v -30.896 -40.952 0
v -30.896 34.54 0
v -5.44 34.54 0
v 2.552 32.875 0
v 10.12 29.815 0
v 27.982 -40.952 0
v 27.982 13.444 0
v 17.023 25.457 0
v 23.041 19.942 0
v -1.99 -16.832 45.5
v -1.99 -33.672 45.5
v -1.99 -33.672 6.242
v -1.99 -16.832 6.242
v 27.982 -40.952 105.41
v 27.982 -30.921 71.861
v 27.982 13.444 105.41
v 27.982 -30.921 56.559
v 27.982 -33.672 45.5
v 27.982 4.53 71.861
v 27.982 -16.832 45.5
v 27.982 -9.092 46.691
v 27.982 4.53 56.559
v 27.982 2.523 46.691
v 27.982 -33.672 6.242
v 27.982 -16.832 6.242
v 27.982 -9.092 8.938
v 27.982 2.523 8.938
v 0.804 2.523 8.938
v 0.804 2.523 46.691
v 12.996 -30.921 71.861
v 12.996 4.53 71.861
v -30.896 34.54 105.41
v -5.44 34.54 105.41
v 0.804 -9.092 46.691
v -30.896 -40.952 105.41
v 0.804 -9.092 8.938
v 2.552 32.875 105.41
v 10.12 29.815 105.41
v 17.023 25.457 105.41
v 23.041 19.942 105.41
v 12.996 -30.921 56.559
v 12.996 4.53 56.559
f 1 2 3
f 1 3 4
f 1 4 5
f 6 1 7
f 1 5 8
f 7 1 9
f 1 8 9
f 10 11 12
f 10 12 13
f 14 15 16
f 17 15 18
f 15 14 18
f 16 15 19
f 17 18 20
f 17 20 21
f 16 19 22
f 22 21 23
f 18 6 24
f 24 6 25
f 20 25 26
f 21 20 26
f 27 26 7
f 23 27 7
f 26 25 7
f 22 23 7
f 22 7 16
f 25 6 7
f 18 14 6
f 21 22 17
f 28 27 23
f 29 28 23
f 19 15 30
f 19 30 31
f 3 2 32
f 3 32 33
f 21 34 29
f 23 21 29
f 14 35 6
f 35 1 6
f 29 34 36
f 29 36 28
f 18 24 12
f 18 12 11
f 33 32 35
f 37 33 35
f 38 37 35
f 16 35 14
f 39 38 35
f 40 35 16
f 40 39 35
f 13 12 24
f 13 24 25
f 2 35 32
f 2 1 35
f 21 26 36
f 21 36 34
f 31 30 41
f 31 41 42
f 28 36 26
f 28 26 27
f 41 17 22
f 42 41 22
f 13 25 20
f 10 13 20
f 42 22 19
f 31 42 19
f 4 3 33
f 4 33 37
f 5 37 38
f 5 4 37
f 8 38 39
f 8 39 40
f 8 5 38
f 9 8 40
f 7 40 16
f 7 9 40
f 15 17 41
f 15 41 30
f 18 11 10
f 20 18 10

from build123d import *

# Parameters (mm, degrees)
F0_W      = 58.878030628
F0_H      = 75.4921324551
F1_DEPTH  = 25.4
F3_DEPTH  = 25.4
F4_DEPTH  = 80.01
F5_W      = 16.8407969177
F5_H      = 39.2584712245
F6_DEPTH  = 29.972
F7_W      = 11.6147371009
F7_H      = 37.7531396225
F8_DEPTH  = 27.178
F10_W     = 35.4502582923
F10_H     = 15.3018832207
F11_DEPTH = 14.986


with BuildPart() as f1:
    # F0 (on Top) → F1 (new body)
    with BuildSketch(Plane.XY):
        with Locations((-1.4573782682, -3.2062288374)):
            Rectangle(F0_W, F0_H)
    extrude(amount=F1_DEPTH)

    # F2 (on face) → F3 (cut)
    with BuildSketch(Plane.XY.offset(25.4)):
        with BuildLine():
            ThreePointArc((-5.4399550781, 34.5398373902), (13.6686067521, 27.7903712145), (27.9816370457, 13.4436087683))
            Line((27.9816370457, 13.4436087683), (27.9816370457, 34.5398373902))
            Line((27.9816370457, 34.5398373902), (-5.4399550781, 34.5398373902))
        make_face()
    extrude(amount=-F3_DEPTH, mode=Mode.SUBTRACT)

    # F4 (add): a face of the model
    f4_faces = [f1.faces().sort_by_distance(p)[0] for p in [
        (-2.600266852, -4.9615268336, 25.4),
    ]]
    extrude(f4_faces, amount=F4_DEPTH)

    # F5 (on face) → F6 (cut)
    with BuildSketch(Plane.YZ.offset(27.9816370457)):
        with Locations((-25.2520013601, 25.8709422778)):
            Rectangle(F5_W, F5_H)
    extrude(amount=-F6_DEPTH, mode=Mode.SUBTRACT)

    # F7 (on face) → F8 (cut)
    with BuildSketch(Plane.YZ.offset(27.9816370457)):
        with Locations((-3.284684848, 27.8146467172)):
            Rectangle(F7_W, F7_H)
    extrude(amount=-F8_DEPTH, mode=Mode.SUBTRACT)

    # F10 (on face) → F11 (cut)
    with BuildSketch(Plane.YZ.offset(27.9816370457)):
        with Locations((-13.1954229437, 64.2097368836)):
            Rectangle(F10_W, F10_H)
    extrude(amount=-F11_DEPTH, mode=Mode.SUBTRACT)


solid = f1.part
